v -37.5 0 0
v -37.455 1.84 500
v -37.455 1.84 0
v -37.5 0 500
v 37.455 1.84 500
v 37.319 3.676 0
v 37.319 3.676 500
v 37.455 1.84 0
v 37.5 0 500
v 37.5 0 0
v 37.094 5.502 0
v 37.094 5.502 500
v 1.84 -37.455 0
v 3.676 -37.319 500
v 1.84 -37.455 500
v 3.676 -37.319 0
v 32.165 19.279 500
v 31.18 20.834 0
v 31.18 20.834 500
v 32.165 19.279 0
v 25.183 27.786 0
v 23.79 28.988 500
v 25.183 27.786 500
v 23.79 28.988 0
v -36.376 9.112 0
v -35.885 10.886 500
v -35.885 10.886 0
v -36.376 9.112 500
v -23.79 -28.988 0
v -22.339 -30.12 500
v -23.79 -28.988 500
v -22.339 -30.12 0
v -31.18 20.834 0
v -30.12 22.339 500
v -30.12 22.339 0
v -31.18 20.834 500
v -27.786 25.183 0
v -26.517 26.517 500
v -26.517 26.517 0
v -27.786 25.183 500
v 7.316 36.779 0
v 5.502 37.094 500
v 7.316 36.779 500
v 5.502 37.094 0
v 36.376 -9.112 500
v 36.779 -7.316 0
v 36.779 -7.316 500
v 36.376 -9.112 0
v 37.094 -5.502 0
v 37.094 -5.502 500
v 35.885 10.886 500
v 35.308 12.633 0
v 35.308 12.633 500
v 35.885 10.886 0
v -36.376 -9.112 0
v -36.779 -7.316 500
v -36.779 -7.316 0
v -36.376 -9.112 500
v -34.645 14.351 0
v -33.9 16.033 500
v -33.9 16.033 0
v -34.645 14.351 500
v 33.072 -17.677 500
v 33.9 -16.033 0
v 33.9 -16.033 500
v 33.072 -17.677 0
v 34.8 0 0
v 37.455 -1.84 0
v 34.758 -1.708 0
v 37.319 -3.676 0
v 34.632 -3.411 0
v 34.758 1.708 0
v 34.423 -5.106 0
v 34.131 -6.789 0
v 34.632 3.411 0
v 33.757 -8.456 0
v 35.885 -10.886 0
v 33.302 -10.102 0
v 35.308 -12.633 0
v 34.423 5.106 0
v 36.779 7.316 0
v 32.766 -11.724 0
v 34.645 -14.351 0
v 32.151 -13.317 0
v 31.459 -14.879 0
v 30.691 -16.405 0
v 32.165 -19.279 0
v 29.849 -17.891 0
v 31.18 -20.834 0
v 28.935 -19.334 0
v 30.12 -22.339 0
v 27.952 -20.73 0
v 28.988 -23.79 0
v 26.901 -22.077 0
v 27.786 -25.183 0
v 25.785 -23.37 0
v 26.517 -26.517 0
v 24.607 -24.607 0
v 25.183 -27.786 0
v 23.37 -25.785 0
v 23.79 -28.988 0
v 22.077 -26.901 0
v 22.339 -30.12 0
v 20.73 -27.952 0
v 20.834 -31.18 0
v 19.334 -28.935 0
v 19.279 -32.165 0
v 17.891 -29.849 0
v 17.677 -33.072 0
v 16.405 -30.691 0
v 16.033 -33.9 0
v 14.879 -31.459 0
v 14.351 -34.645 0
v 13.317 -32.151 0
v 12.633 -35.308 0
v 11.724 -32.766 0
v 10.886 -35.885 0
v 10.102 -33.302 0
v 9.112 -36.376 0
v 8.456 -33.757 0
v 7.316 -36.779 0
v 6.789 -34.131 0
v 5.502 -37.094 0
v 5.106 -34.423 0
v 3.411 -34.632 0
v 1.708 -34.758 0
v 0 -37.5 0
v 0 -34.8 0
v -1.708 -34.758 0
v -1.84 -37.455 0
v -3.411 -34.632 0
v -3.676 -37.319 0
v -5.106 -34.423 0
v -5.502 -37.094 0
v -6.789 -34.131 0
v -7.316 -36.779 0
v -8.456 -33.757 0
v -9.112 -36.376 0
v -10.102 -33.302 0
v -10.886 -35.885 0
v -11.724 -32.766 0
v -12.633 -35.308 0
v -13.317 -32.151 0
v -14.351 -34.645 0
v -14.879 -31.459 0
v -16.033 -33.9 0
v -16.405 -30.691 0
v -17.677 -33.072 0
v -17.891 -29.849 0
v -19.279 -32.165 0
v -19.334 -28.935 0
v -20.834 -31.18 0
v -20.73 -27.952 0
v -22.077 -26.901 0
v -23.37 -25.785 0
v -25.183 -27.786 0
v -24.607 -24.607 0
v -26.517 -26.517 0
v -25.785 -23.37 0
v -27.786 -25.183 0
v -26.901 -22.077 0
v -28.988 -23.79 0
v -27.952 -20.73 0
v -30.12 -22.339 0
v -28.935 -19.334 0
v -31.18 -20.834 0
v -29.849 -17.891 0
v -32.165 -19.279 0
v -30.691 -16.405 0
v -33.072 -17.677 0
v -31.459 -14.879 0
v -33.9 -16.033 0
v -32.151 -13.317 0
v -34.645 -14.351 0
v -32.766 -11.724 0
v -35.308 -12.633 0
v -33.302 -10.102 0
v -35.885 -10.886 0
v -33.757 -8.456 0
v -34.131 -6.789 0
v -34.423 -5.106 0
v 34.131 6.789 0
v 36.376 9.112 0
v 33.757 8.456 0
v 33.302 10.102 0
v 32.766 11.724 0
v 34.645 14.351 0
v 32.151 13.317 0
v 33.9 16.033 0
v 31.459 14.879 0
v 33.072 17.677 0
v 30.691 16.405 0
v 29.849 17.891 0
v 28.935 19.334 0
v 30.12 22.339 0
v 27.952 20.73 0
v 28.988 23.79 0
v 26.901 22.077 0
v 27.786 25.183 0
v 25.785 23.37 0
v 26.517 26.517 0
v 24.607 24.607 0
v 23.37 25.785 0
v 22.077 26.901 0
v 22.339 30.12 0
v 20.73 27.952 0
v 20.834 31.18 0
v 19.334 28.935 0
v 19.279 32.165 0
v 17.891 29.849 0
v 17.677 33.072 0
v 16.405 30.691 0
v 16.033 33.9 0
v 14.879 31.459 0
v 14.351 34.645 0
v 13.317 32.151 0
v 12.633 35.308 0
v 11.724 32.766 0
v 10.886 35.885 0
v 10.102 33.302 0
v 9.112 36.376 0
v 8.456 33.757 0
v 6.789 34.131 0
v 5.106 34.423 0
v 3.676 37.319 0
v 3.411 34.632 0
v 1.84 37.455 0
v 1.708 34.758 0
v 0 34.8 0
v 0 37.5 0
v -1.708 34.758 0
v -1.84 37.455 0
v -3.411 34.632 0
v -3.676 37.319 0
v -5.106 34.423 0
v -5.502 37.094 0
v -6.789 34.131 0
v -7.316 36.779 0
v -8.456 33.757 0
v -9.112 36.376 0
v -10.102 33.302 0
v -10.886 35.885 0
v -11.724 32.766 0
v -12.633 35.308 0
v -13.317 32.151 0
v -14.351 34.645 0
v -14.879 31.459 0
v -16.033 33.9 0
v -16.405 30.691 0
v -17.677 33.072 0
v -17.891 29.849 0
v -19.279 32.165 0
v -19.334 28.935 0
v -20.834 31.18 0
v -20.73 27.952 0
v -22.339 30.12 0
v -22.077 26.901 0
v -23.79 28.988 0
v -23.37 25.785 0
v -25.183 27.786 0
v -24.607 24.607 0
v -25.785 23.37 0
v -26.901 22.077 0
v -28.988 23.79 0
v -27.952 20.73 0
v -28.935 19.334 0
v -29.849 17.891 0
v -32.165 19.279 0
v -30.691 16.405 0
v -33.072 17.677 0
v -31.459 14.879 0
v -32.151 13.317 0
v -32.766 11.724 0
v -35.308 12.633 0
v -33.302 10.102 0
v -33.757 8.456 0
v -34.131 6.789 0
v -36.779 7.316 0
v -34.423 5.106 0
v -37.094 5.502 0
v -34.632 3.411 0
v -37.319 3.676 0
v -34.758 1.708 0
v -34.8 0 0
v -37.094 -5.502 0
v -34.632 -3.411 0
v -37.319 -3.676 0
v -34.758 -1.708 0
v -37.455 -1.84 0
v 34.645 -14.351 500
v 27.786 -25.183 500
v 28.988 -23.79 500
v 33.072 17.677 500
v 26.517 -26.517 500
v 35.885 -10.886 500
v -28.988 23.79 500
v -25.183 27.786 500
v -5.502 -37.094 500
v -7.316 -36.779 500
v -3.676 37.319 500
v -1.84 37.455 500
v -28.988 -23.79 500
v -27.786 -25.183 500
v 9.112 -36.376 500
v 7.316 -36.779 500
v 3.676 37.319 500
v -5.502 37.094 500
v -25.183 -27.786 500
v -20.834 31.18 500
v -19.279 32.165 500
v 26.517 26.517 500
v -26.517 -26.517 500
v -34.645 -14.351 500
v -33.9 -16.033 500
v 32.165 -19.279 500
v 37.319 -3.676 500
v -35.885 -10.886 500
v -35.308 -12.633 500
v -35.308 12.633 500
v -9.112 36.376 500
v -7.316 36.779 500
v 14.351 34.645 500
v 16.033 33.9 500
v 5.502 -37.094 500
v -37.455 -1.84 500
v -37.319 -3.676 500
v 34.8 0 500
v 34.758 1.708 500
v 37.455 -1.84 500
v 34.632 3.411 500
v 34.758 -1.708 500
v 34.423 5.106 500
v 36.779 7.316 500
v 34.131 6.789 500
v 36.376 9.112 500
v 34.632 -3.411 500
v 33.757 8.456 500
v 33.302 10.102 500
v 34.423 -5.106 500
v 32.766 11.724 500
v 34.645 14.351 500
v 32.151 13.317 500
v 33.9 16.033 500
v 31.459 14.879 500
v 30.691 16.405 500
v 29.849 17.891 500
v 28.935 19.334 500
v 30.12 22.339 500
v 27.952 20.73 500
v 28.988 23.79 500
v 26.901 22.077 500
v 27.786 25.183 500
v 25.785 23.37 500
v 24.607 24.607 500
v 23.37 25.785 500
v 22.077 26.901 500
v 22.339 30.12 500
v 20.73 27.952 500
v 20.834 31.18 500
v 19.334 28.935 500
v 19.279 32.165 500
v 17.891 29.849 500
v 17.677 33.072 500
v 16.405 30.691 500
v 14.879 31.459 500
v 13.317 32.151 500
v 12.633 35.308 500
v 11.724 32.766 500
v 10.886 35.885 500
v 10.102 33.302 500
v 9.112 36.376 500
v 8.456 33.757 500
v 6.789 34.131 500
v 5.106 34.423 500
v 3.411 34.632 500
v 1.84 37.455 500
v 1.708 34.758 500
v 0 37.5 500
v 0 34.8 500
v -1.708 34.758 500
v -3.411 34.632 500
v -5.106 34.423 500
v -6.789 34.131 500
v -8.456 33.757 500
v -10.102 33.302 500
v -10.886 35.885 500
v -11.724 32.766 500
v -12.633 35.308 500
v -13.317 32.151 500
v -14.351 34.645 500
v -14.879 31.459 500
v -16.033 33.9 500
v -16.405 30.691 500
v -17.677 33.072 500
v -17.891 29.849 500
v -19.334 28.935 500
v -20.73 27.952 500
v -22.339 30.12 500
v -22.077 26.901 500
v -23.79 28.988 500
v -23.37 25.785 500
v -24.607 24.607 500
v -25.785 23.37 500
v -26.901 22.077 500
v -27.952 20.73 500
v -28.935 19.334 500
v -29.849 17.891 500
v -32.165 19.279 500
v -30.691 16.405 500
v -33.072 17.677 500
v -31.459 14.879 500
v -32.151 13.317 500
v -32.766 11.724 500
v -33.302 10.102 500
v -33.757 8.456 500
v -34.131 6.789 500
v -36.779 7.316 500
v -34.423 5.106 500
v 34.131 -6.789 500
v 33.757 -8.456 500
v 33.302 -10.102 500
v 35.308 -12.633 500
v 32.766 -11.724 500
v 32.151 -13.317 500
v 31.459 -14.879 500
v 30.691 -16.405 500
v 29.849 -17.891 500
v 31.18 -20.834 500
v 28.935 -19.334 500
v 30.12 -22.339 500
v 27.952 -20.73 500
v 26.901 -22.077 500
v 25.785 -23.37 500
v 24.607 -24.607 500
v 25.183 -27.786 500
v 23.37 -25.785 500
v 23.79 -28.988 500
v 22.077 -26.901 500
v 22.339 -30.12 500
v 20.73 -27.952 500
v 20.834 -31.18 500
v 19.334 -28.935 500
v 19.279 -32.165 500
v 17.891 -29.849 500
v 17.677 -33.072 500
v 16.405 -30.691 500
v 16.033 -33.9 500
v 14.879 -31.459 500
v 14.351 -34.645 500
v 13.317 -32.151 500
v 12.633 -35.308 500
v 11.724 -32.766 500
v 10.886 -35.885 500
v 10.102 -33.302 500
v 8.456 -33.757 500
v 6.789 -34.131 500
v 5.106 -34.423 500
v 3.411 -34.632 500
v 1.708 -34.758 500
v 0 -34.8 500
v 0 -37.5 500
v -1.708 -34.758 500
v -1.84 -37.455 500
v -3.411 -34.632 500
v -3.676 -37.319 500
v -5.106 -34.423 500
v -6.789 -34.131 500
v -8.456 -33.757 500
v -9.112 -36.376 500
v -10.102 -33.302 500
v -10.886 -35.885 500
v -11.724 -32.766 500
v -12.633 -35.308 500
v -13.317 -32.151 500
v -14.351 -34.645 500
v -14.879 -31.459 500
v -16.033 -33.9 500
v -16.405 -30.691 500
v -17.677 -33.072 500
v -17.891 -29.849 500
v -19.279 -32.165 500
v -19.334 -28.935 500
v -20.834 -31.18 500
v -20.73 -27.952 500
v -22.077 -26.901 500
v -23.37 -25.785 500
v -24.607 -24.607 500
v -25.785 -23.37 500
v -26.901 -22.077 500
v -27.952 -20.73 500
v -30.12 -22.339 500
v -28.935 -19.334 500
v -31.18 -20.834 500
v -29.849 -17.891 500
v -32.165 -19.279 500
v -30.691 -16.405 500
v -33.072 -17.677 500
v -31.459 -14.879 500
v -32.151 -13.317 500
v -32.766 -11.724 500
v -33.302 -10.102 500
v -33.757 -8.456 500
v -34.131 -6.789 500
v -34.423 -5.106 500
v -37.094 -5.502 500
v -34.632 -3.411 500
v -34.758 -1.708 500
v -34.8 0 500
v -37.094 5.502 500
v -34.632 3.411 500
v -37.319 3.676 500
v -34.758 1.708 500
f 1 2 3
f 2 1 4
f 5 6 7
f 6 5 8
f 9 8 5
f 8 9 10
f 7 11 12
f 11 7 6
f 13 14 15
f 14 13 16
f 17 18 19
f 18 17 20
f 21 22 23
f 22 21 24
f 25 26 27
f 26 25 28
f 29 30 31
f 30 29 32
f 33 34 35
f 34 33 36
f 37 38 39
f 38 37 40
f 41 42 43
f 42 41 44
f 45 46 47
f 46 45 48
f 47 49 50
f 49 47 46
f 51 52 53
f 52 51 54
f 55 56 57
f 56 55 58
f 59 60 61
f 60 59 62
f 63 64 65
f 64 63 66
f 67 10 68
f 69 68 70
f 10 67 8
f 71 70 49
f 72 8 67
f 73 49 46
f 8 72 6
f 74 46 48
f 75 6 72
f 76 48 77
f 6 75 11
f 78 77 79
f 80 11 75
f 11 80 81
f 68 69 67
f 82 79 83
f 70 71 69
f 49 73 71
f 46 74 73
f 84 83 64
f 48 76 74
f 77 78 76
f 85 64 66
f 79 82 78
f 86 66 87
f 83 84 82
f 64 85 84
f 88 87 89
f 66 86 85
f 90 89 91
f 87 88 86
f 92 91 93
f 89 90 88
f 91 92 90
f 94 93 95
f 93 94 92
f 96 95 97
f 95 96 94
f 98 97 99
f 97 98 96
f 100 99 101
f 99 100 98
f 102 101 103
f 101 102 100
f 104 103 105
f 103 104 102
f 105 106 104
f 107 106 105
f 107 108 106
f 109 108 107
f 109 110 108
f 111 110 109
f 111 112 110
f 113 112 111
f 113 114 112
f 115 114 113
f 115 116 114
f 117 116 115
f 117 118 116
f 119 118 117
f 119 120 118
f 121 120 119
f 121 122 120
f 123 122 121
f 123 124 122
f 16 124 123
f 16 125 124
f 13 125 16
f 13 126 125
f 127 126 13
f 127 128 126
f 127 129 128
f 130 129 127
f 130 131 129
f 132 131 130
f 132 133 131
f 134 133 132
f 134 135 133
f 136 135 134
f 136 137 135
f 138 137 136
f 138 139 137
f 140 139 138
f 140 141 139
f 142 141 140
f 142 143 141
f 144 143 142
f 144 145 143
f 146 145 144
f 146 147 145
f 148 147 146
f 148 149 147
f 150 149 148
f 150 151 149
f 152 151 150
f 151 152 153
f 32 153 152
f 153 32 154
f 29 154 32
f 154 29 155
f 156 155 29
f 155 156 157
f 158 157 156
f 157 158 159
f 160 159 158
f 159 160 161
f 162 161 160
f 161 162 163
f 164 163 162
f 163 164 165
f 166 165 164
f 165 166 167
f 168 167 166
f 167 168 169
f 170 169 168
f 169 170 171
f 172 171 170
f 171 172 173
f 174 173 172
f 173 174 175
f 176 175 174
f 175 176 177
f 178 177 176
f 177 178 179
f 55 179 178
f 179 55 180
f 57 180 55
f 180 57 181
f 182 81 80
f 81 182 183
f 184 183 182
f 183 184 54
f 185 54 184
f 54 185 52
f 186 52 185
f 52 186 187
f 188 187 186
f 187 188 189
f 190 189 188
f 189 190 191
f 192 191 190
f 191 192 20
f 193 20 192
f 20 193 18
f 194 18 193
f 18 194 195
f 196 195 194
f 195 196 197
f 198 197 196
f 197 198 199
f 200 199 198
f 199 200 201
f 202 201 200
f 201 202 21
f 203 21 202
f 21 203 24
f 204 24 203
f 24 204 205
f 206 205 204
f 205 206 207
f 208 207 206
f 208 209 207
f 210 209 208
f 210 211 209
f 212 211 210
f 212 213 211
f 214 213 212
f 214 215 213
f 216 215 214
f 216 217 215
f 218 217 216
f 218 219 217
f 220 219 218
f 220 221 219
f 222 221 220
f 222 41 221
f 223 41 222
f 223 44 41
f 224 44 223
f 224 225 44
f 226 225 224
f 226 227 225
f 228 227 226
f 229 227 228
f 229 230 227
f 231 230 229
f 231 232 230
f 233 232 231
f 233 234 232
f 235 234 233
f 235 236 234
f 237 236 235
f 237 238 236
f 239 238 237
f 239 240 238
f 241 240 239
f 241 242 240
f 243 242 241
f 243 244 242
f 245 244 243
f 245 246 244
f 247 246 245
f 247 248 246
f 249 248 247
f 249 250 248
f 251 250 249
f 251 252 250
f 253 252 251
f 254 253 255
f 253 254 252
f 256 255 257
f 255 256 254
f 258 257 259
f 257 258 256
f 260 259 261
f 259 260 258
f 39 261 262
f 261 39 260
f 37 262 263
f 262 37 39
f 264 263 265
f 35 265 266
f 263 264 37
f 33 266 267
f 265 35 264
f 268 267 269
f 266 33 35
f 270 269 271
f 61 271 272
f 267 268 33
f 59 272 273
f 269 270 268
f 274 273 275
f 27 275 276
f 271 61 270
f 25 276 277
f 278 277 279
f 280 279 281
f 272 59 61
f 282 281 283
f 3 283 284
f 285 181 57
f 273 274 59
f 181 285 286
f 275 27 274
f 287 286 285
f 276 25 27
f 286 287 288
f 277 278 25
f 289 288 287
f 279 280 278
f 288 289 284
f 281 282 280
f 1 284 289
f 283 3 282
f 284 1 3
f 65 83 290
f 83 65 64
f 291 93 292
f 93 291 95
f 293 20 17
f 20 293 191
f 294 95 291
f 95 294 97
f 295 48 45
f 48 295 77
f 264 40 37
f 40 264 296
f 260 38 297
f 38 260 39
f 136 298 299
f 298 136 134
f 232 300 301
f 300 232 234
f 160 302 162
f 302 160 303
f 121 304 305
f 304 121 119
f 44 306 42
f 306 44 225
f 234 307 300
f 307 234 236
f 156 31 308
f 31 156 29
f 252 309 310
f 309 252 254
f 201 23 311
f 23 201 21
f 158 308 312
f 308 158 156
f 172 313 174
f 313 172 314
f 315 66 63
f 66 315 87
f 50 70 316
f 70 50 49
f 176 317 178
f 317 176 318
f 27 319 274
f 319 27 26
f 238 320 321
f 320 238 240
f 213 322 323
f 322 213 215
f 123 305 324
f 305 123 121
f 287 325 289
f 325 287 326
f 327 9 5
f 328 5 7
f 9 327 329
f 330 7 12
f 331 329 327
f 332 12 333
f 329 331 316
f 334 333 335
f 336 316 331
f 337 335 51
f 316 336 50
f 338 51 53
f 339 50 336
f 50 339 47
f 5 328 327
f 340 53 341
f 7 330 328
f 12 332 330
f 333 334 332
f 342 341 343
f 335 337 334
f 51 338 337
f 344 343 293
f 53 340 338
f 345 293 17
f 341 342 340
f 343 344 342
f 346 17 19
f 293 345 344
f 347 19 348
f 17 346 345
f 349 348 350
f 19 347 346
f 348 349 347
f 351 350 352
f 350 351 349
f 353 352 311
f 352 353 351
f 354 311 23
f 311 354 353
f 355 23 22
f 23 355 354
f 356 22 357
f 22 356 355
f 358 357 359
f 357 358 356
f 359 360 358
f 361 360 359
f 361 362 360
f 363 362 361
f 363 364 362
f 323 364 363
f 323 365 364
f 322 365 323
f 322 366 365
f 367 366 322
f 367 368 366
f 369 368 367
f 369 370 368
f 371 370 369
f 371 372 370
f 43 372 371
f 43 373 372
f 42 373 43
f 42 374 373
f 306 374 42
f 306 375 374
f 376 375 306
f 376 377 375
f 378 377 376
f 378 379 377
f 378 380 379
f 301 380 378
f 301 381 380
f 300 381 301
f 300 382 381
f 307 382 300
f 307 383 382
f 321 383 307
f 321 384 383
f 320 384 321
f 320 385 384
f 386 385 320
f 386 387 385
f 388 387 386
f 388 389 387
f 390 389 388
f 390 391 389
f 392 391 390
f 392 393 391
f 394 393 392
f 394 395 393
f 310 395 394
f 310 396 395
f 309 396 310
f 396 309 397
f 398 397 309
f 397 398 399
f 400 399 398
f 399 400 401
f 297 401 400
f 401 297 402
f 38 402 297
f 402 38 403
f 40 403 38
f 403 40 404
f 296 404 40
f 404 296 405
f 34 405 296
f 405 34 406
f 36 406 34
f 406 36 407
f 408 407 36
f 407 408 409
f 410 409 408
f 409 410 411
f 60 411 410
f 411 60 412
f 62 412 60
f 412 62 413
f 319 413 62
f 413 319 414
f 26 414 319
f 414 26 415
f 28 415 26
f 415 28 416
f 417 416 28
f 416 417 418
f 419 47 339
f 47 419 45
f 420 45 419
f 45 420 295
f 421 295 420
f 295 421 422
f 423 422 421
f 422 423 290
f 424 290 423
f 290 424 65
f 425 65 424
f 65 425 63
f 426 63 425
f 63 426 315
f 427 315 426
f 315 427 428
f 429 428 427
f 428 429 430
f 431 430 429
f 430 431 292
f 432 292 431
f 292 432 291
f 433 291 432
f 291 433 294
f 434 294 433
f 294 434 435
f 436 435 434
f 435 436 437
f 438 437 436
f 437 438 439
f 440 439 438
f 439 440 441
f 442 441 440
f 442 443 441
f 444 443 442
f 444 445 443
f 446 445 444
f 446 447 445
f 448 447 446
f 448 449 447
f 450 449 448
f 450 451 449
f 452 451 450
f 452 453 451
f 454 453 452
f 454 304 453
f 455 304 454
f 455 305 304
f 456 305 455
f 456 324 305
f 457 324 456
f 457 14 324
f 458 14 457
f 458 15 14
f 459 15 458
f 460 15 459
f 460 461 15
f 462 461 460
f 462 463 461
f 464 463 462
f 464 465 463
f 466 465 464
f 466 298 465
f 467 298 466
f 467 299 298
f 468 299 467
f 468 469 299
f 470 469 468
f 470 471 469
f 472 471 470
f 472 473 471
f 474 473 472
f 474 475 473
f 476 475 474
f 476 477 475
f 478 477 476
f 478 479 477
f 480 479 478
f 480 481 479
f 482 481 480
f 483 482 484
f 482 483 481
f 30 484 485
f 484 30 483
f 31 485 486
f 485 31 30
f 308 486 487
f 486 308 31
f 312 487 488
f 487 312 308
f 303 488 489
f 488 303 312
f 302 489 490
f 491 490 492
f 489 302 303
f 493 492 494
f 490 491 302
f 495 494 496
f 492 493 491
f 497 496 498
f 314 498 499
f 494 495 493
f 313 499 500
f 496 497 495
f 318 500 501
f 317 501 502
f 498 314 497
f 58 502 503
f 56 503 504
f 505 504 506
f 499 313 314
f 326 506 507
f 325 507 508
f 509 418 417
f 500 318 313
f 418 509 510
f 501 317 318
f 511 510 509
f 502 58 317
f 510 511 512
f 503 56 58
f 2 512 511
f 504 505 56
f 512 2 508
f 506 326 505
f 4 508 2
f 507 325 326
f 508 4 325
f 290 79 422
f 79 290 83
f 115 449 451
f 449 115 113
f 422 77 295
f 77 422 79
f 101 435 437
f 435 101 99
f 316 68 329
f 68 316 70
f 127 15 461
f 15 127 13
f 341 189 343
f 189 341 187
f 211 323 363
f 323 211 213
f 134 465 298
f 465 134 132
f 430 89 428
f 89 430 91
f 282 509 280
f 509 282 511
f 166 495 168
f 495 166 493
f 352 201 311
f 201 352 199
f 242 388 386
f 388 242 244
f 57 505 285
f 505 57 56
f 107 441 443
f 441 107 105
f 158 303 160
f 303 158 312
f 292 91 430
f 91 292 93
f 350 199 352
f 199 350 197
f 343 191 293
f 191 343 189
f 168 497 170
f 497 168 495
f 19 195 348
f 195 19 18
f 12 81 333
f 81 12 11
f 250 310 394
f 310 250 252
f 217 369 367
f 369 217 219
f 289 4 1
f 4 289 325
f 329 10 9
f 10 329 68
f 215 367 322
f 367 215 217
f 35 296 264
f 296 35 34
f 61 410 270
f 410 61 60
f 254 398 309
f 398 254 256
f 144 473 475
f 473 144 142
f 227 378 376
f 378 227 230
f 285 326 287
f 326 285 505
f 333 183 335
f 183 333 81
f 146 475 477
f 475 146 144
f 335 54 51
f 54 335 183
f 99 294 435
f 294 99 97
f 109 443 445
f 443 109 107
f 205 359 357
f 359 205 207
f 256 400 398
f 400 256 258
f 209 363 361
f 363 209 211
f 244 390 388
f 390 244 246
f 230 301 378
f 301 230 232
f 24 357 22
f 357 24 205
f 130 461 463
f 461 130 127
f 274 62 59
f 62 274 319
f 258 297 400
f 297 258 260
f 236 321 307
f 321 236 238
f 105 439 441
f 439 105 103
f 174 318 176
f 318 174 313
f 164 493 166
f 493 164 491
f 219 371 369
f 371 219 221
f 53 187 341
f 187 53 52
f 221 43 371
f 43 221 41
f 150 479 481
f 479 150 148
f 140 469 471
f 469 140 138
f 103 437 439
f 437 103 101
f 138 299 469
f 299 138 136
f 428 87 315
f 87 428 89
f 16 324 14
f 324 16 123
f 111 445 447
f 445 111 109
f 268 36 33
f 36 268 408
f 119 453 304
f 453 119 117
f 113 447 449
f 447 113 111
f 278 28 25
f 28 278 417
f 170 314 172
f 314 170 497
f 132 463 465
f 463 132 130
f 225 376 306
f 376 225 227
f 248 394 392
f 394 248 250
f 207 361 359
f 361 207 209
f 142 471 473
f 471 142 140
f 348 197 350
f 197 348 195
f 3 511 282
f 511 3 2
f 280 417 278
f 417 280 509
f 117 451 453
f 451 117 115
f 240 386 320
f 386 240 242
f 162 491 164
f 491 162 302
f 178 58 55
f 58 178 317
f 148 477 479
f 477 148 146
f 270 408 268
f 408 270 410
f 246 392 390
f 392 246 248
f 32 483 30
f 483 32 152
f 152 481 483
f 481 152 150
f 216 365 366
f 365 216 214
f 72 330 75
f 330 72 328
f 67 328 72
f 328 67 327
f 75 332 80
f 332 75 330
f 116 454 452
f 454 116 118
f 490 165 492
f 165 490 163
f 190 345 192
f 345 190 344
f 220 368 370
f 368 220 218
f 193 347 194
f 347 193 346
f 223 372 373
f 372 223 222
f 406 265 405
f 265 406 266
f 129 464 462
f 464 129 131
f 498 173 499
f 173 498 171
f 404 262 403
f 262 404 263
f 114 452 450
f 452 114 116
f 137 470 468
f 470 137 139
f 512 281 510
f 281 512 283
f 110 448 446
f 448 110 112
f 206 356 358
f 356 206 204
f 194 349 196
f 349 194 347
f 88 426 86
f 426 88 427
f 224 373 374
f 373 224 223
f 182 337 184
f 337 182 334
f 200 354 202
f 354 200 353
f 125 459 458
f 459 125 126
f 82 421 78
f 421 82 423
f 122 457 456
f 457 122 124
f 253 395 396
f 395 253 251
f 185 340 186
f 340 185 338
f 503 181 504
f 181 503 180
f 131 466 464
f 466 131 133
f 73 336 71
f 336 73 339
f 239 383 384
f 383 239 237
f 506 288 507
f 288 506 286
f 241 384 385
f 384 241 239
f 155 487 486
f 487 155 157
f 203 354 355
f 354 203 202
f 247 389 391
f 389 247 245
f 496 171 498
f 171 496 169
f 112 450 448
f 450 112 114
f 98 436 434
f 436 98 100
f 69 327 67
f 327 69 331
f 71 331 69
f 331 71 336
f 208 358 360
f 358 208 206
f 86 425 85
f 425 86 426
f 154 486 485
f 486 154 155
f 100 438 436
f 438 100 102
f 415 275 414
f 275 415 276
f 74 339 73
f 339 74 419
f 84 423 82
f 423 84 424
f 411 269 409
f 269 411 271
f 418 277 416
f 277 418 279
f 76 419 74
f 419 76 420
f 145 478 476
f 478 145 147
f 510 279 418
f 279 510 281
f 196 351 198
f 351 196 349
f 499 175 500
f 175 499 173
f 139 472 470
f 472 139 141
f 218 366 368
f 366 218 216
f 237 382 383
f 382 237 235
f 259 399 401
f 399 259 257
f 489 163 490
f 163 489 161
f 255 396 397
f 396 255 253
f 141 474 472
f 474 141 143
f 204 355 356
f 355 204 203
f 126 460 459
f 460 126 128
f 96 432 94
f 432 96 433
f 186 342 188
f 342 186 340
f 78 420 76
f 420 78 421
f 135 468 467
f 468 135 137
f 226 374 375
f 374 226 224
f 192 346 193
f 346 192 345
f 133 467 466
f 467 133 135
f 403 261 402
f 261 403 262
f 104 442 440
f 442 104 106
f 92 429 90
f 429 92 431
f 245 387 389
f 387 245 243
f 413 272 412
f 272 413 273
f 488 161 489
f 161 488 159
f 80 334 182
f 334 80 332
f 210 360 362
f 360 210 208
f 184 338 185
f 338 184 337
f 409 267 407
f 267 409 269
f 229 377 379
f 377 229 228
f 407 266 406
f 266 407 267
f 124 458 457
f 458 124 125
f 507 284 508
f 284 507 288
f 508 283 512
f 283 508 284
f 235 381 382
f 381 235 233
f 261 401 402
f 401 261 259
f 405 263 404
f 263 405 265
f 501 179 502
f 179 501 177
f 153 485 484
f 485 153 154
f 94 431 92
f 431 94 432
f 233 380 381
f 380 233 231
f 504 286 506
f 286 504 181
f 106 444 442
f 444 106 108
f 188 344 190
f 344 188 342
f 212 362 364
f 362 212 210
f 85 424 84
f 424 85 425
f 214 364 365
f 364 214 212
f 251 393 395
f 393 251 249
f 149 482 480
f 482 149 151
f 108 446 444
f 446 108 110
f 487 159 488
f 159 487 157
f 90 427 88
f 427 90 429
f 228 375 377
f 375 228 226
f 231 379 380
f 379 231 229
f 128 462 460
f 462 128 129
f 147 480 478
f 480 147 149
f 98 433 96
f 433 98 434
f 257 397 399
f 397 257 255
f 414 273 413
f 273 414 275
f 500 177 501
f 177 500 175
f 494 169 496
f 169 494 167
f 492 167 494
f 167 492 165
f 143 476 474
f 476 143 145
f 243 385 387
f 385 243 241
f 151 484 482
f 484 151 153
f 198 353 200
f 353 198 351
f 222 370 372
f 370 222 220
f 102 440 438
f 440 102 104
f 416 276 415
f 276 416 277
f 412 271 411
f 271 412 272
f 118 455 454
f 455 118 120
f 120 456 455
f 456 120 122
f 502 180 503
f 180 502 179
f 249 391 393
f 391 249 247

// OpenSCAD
$fn = 128;

// HT pipe parameters (approximate for HT 75)
od = 75;          // outer diameter (mm)
wall = 2.7;       // wall thickness (mm) typical for HT 75
len = 500;        // length (mm)

id = od - 2*wall;

module ht_pipe(od, id, len) {
    difference() {
        cylinder(h = len, d = od);
        translate([0,0,-0.5])
            cylinder(h = len + 1, d = id);
    }
}

ht_pipe(od, id, len);
